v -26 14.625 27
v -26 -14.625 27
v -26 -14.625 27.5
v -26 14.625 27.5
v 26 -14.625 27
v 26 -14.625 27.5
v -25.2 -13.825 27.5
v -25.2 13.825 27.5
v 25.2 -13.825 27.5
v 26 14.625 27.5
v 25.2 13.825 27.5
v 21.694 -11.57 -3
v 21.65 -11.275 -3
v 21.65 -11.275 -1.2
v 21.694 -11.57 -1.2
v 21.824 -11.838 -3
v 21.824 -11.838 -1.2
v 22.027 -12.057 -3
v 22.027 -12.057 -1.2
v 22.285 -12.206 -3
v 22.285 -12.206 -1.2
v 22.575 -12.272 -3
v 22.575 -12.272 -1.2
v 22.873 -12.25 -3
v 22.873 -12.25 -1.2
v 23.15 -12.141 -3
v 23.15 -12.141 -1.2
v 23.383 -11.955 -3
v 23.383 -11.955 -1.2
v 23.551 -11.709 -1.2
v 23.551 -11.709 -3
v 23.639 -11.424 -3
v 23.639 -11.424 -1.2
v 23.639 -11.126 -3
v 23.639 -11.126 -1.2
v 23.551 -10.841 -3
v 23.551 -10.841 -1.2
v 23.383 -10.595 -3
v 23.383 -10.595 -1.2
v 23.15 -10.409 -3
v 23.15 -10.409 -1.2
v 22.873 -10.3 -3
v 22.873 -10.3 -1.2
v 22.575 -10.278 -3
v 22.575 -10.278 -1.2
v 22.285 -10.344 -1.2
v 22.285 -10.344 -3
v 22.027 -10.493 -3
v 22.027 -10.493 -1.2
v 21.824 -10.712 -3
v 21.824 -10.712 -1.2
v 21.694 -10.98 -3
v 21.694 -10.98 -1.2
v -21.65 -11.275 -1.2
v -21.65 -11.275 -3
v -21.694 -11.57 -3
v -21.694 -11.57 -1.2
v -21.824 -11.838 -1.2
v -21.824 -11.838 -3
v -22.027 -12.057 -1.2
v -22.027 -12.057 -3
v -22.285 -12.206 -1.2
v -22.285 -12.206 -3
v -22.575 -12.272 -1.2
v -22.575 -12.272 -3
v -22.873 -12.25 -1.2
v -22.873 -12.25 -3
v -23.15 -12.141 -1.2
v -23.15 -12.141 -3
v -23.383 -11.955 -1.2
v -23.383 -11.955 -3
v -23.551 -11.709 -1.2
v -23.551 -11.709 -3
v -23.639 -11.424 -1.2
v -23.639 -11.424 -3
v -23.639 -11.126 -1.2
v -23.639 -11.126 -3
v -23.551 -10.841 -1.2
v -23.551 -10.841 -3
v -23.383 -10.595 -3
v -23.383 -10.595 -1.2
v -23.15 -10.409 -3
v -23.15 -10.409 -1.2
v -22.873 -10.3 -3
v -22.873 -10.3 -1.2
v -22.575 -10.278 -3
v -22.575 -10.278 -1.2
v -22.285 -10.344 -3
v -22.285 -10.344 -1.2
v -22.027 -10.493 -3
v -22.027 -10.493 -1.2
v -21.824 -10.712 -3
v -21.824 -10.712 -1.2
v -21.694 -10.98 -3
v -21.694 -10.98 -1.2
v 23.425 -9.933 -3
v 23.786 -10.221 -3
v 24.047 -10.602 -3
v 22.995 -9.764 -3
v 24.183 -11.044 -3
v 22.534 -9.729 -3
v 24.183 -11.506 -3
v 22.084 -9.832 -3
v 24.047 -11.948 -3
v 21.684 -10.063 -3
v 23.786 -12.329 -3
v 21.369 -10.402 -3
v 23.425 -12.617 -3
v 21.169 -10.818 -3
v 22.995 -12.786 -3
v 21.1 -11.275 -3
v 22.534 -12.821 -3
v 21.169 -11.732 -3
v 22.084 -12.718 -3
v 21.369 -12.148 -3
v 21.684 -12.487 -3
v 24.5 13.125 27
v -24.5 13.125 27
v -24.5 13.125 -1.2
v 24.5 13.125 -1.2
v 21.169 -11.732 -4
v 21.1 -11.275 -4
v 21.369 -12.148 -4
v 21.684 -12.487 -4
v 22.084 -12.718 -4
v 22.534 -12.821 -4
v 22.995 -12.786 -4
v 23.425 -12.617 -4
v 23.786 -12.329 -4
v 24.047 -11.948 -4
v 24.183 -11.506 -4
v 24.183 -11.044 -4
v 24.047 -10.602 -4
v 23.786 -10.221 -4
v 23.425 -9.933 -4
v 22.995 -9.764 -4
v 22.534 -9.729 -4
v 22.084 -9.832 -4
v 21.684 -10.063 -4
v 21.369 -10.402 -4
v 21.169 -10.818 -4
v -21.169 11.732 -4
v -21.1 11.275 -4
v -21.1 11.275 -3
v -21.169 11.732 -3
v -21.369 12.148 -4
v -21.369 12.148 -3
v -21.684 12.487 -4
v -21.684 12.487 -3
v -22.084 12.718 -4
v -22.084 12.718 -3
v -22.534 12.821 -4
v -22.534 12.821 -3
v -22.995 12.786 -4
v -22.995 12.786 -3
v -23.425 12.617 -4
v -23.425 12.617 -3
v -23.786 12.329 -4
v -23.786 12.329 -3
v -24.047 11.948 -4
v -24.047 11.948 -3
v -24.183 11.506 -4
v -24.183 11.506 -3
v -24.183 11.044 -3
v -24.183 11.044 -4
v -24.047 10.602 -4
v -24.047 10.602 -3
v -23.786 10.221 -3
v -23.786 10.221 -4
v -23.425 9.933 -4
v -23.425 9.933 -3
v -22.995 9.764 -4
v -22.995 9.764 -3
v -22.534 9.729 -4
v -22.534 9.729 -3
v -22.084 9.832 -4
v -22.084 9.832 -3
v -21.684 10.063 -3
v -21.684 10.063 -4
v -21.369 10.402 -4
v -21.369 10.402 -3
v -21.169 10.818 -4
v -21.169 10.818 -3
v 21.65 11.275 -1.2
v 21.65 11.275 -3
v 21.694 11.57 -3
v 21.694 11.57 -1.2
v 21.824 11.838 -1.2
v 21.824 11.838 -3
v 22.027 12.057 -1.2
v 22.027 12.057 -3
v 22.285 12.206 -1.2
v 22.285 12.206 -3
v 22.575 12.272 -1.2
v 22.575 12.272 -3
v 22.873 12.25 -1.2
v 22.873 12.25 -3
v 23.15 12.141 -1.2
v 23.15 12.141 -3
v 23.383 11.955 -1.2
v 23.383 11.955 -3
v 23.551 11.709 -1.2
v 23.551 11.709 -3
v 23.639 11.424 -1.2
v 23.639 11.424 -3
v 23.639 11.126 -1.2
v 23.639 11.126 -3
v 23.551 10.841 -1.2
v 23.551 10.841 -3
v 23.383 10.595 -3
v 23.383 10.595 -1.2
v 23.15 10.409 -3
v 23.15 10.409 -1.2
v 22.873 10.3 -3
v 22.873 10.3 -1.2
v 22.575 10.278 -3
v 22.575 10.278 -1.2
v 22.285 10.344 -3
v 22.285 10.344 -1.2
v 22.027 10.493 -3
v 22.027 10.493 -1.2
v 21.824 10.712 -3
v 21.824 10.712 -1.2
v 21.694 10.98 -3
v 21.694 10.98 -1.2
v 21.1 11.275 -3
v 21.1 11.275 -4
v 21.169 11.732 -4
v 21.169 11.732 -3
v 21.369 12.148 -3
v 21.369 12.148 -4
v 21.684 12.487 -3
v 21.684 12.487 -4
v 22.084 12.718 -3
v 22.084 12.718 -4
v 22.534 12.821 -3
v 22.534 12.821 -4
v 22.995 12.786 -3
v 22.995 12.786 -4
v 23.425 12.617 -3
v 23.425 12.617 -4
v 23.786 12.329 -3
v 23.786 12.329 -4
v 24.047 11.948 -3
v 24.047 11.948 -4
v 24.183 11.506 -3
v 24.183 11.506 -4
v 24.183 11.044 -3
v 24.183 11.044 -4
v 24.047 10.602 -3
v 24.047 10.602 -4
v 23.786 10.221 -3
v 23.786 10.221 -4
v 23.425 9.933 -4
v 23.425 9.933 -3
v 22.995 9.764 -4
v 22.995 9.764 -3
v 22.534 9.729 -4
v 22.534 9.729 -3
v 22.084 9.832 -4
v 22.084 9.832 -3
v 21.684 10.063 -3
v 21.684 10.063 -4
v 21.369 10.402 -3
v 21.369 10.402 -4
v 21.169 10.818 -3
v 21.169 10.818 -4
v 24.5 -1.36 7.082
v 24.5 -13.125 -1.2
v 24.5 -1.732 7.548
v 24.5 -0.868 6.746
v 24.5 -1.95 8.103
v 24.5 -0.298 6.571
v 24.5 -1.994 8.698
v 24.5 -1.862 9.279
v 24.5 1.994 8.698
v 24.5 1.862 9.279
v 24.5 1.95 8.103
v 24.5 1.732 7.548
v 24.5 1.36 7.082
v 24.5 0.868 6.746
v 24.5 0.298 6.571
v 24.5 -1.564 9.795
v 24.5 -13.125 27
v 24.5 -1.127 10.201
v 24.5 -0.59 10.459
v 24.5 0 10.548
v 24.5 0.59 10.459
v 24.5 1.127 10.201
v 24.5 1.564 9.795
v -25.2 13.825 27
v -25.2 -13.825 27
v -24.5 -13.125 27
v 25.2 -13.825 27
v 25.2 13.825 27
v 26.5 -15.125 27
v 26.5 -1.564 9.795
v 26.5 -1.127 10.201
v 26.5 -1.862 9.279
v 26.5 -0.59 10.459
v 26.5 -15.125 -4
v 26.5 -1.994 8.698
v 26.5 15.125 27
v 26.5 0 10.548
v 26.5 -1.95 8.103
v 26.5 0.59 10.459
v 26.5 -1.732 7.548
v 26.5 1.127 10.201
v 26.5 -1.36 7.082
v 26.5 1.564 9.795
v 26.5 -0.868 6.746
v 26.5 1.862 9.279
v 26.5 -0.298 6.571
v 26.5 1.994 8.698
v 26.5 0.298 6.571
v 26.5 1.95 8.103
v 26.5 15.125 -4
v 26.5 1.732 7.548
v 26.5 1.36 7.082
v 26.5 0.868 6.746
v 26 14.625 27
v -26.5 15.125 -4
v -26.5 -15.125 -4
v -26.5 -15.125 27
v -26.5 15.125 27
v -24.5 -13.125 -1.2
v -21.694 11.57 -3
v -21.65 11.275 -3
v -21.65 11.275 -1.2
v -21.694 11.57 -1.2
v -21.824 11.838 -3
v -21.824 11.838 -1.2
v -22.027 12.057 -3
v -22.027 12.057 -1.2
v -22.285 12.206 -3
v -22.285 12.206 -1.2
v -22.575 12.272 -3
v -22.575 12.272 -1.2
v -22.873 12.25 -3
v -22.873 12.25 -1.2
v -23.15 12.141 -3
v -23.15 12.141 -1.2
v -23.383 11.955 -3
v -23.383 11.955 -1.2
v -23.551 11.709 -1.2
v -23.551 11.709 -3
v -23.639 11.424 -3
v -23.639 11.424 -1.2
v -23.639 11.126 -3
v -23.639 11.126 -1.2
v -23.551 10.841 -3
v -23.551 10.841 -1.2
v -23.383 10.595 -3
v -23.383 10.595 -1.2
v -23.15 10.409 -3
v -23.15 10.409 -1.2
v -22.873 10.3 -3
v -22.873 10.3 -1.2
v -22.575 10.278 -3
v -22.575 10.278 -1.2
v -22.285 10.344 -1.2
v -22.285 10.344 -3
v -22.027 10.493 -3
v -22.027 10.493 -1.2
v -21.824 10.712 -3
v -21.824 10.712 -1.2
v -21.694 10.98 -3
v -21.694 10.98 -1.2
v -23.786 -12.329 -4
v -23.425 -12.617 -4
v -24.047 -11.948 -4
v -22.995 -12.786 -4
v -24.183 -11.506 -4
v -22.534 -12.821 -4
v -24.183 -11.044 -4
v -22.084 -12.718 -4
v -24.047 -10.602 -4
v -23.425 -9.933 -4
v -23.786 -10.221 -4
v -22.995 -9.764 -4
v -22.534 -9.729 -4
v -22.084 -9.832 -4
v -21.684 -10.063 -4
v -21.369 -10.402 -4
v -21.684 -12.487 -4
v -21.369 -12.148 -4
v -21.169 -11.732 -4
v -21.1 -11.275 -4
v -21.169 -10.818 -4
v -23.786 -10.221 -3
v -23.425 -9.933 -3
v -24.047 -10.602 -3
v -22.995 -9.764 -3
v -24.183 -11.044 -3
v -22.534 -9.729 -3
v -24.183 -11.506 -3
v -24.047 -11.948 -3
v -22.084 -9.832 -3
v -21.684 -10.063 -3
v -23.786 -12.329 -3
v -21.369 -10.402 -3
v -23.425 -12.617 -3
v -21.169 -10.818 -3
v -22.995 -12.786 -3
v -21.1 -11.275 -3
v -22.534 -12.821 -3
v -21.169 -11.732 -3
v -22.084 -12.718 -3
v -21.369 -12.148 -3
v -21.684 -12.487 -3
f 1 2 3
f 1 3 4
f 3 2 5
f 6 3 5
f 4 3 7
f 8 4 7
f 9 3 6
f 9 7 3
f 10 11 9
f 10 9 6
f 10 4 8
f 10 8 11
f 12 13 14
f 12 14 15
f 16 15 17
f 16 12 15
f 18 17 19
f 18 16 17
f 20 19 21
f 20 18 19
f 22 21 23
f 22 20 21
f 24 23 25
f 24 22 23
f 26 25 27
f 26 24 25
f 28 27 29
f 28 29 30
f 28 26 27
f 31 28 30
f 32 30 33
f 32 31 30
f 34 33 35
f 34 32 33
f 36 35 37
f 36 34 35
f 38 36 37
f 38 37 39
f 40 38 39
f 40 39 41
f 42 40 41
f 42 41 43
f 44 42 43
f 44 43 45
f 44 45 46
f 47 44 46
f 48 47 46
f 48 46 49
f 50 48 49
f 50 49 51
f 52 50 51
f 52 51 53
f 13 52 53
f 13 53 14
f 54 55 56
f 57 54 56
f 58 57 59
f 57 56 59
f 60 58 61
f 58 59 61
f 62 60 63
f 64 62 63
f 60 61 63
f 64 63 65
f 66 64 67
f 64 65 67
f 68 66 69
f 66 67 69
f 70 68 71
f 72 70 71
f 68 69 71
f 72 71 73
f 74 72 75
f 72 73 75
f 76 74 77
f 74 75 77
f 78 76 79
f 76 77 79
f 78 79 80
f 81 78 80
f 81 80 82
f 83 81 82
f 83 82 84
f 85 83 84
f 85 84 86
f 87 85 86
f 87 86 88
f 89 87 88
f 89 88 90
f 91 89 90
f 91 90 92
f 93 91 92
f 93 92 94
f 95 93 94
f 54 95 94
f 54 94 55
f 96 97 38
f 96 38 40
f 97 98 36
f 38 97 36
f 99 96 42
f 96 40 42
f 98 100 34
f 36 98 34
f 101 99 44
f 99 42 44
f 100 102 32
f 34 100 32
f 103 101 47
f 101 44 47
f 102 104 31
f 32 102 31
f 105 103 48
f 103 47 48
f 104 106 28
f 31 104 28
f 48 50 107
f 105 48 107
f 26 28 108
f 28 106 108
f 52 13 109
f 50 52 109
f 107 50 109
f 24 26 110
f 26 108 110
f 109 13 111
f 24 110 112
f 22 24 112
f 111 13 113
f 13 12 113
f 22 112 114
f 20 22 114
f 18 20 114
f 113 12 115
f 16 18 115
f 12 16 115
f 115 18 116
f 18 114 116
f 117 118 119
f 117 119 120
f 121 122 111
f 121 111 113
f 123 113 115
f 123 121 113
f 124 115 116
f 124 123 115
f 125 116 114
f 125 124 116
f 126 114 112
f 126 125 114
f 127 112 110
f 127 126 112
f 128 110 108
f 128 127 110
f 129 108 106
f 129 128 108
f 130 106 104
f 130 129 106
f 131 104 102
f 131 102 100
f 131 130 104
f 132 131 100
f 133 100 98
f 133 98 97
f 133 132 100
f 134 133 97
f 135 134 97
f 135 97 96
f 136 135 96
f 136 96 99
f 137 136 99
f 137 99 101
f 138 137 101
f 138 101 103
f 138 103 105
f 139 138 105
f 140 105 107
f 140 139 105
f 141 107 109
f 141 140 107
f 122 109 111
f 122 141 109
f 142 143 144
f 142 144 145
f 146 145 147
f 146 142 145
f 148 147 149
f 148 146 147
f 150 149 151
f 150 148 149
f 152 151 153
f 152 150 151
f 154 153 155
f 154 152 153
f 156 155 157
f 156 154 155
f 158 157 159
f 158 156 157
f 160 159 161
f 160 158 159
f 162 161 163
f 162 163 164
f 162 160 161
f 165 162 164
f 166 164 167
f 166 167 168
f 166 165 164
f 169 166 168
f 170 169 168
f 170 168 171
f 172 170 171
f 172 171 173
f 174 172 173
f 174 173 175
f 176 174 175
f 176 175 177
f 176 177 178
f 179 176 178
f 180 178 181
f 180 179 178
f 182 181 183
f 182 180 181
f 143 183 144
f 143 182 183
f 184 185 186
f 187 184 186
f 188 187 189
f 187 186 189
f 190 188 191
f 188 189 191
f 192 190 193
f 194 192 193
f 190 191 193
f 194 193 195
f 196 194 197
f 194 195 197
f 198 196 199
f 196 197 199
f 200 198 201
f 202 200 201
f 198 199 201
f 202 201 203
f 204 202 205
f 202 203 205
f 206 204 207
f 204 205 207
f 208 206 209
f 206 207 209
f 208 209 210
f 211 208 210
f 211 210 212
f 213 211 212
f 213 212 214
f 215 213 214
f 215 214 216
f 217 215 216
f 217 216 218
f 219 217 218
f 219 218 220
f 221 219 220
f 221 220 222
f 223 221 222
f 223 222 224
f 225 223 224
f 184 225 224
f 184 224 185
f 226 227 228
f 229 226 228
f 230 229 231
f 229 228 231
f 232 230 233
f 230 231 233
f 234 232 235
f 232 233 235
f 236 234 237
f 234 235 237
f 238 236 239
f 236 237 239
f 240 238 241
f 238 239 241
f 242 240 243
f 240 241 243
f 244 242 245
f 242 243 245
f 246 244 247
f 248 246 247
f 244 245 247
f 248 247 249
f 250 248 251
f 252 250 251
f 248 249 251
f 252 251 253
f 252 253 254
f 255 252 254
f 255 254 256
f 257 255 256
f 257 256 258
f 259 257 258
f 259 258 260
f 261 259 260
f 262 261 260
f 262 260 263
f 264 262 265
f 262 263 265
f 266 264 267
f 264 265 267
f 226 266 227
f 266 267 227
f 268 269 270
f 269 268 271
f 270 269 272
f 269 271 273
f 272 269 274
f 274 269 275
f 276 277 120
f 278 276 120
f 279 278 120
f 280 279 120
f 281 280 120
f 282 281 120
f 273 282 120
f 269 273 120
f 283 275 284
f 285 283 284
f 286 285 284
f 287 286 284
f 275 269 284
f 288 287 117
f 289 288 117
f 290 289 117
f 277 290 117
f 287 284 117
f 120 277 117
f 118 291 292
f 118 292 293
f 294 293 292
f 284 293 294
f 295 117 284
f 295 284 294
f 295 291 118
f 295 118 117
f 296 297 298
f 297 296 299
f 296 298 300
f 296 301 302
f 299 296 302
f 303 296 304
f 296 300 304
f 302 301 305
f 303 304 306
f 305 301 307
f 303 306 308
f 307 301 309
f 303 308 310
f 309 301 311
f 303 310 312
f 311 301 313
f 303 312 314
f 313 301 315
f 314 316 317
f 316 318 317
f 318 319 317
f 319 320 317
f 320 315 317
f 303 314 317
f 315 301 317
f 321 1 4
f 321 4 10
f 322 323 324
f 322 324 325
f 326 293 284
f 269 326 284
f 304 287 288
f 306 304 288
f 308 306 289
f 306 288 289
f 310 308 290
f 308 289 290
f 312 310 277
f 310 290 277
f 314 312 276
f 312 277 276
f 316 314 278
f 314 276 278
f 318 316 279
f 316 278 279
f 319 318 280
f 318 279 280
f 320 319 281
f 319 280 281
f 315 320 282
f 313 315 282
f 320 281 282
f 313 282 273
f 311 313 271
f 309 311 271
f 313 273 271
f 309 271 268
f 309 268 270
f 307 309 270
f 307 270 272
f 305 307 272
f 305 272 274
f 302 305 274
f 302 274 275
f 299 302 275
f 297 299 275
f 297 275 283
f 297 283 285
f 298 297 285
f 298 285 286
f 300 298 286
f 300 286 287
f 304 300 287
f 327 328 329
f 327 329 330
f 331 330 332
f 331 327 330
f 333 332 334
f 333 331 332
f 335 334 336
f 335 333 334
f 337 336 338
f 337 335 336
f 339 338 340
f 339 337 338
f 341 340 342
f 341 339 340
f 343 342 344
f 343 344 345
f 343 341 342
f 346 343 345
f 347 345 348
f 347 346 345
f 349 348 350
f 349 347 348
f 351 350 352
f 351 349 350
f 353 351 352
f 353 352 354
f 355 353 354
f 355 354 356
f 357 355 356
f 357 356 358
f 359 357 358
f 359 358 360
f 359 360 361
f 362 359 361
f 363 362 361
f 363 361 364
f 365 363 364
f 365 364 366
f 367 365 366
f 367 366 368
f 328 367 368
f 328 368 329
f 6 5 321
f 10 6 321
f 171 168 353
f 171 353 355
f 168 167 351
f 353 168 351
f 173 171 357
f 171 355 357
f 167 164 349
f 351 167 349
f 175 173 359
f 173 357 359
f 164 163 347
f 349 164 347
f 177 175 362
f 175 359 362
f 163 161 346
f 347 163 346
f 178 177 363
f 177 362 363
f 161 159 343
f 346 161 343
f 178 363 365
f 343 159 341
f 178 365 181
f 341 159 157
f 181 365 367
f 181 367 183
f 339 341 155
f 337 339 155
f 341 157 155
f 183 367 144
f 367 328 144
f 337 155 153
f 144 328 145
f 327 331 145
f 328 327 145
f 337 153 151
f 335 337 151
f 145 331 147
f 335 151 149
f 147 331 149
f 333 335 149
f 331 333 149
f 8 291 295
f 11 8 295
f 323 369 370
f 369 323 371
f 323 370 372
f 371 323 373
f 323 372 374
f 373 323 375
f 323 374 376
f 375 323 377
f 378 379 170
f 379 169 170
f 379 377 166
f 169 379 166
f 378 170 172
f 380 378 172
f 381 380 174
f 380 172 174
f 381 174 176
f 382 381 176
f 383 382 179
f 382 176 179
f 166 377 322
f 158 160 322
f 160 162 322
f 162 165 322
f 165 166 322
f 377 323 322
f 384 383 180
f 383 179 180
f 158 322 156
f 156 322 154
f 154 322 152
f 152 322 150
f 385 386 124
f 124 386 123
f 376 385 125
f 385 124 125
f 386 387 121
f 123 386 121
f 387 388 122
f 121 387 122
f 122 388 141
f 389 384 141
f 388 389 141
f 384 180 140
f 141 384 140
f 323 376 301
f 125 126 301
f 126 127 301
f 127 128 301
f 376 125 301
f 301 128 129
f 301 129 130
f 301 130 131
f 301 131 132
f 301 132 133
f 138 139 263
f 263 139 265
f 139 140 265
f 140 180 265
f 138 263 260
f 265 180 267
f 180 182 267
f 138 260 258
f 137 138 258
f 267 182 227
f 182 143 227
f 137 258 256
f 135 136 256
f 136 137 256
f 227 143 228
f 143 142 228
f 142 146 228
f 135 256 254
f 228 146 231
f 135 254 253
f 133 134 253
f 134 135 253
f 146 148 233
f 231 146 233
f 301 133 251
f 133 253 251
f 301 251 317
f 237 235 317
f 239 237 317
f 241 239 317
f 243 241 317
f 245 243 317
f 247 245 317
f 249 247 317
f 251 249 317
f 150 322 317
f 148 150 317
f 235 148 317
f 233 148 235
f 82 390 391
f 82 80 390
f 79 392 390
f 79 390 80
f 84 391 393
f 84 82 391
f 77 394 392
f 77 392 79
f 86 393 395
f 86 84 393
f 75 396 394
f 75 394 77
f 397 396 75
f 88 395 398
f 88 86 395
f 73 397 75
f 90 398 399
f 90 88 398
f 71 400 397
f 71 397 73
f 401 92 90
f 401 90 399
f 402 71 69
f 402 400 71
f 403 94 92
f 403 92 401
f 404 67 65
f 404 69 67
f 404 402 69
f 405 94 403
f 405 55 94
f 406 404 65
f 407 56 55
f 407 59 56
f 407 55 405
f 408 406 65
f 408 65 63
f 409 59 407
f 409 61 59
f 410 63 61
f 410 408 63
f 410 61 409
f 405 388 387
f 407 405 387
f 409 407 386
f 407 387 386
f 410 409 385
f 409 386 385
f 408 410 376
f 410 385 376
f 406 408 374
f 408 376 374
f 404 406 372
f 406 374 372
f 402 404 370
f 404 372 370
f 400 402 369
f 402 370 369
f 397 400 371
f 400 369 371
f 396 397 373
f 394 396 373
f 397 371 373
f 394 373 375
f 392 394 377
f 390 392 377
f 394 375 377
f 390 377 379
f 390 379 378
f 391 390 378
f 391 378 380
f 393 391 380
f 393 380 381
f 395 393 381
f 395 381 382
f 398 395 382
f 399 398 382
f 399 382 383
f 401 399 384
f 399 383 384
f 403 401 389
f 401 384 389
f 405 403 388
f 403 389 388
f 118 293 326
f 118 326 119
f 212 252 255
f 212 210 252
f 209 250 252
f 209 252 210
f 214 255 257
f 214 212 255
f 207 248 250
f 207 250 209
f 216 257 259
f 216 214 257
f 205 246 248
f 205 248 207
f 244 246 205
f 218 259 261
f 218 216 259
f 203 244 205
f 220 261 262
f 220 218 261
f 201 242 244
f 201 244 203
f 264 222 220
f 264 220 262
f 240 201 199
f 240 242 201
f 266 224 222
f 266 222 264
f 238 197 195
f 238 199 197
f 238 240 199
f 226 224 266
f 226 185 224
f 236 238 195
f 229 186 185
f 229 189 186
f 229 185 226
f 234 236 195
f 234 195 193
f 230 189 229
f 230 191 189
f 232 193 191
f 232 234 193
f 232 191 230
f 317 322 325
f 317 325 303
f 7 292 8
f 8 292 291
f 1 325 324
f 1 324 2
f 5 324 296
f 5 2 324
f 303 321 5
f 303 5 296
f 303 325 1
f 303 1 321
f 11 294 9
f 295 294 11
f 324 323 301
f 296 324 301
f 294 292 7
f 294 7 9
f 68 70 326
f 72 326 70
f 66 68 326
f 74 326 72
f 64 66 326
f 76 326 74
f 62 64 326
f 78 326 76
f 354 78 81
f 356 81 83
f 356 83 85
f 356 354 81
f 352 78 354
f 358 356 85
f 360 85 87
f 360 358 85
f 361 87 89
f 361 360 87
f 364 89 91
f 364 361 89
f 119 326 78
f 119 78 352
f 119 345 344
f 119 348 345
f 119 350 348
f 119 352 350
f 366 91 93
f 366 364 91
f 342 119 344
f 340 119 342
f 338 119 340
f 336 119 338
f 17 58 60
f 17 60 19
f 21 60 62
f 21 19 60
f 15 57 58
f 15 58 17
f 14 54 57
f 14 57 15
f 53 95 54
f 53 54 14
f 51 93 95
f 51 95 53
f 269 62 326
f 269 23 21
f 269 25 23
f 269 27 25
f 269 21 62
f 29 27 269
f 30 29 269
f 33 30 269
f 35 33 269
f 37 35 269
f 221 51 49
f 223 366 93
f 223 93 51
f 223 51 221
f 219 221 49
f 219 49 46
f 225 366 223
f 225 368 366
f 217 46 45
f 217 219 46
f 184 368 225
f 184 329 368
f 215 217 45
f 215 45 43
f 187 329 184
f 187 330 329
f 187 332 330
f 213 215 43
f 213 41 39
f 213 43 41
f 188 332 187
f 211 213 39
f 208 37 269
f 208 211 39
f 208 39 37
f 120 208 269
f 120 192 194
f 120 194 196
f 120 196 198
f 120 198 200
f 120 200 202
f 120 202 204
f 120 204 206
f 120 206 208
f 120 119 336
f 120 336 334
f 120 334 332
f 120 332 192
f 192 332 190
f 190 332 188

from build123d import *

# Parameters (mm, degrees)
EXTRUDE_1_DEPTH          = 27
EXTRUDE_1_DEPTH_BACK     = 4
SKETCH_1_W               = 53
SKETCH_1_H               = 30.25
SKETCH_2_W               = 49
SKETCH_2_H               = 26.25
CUT_EXTRUDE_1_DEPTH      = 28.2
SKETCH_3_W               = 52
SKETCH_3_H               = 29.25
SKETCH_3_W_2             = 50.4
SKETCH_3_H_2             = 27.65
CUT_EXTRUDE_2_DEPTH      = 1
CUT_EXTRUDE_3_REACH      = 45.497
SKETCH_4_R               = 1
SKETCH_5_R               = 1.55
CUT_EXTRUDE_4_DEPTH      = 1
MIRROR_2_COPY_1_REACH    = 45.497
MIRROR_2_COPY_1_SKETCH_R = 1
MIRROR_2_COPY_2_SKETCH_R = 1.55
MIRROR_2_COPY_2_DEPTH    = 1
SKETCH_7_R               = 2
CUT_EXTRUDE_6_DEPTH      = 60.655390578
SKETCH_8_W               = 52
SKETCH_8_H               = 29.25
SKETCH_8_W_2             = 50.4
SKETCH_8_H_2             = 27.65
EXTRUDE_2_DEPTH          = 1.5


with BuildPart() as part:
    # 草图1 → 凸台-拉伸1 (new, two sides: drawn at the far end of the back side and taken through both)
    with BuildSketch(Plane.XY.offset(-EXTRUDE_1_DEPTH_BACK)):
        Rectangle(SKETCH_1_W, SKETCH_1_H)
    extrude(amount=EXTRUDE_1_DEPTH + EXTRUDE_1_DEPTH_BACK)

    # 草图2 → 切除-拉伸1 (cut)
    with BuildSketch(Plane.XY.offset(27)):
        Rectangle(SKETCH_2_W, SKETCH_2_H)
    extrude(amount=-CUT_EXTRUDE_1_DEPTH, mode=Mode.SUBTRACT)

    # 草图3 → 切除-拉伸2 (cut)
    with BuildSketch(Plane.XY.offset(27)):
        Rectangle(SKETCH_3_W, SKETCH_3_H)
        Rectangle(SKETCH_3_W_2, SKETCH_3_H_2, mode=Mode.SUBTRACT)
    extrude(amount=-CUT_EXTRUDE_2_DEPTH, mode=Mode.SUBTRACT)

    # 草图4 → 切除-拉伸3 (cut, up to next)
    with BuildSketch(Plane(origin=(0, 0, -4), x_dir=(-1, 0, 0), z_dir=(0, 0, -1)), mode=Mode.PRIVATE) as cut_extrude_3_sk1:
        with Locations((-22.65, 11.275)):
            Circle(SKETCH_4_R)
    cut_extrude_3_tool1 = extrude(cut_extrude_3_sk1.sketch, amount=-CUT_EXTRUDE_3_REACH, mode=Mode.PRIVATE) & part.part
    cut_extrude_3 = cut_extrude_3_tool1.solids().sort_by_distance((22.65, 11.275, -4))[0]
    add(cut_extrude_3, mode=Mode.SUBTRACT)

    # 草图5 → 切除-拉伸4 (cut)
    with BuildSketch(Plane(origin=(0, 0, -4), x_dir=(-1, 0, 0), z_dir=(0, 0, -1))):
        with Locations((-22.65, 11.275)):
            Circle(SKETCH_5_R)
    cut_extrude_4 = extrude(amount=-CUT_EXTRUDE_4_DEPTH, mode=Mode.SUBTRACT)

    # 镜向1: 切除-拉伸3, 切除-拉伸4 across plane
    add(cut_extrude_3.mirror(Plane.ZX), mode=Mode.SUBTRACT)
    add(cut_extrude_4.mirror(Plane.ZX), mode=Mode.SUBTRACT)

    # 镜向2: 切除-拉伸3, 切除-拉伸4 across plane
    add(cut_extrude_3.mirror(Plane(origin=(0, 0, 0), x_dir=(0, 0, 1), z_dir=(1, 0, 0))), mode=Mode.SUBTRACT)
    add(cut_extrude_4.mirror(Plane(origin=(0, 0, 0), x_dir=(0, 0, 1), z_dir=(1, 0, 0))), mode=Mode.SUBTRACT)

    # 镜向2 copy 1 sketch → 镜向2 copy 1 (cut, up to next)
    with BuildSketch(Plane(origin=(0, 0, -4), x_dir=(1, 0, 0), z_dir=(0, 0, -1)), mode=Mode.PRIVATE) as mirror_2_copy_1_sk1:
        with Locations((-22.65, 11.275)):
            Circle(MIRROR_2_COPY_1_SKETCH_R)
    mirror_2_copy_1_tool1 = extrude(mirror_2_copy_1_sk1.sketch, amount=-MIRROR_2_COPY_1_REACH, mode=Mode.PRIVATE) & part.part
    add(mirror_2_copy_1_tool1.solids().sort_by_distance((-22.65, -11.275, -4))[0], mode=Mode.SUBTRACT)

    # 镜向2 copy 2 sketch → 镜向2 copy 2 (cut)
    with BuildSketch(Plane(origin=(0, 0, -4), x_dir=(1, 0, 0), z_dir=(0, 0, -1))):
        with Locations((-22.65, 11.275)):
            Circle(MIRROR_2_COPY_2_SKETCH_R)
    extrude(amount=-MIRROR_2_COPY_2_DEPTH, mode=Mode.SUBTRACT)

    # 草图7 → 切除-拉伸6 (cut, through all)
    with BuildSketch(Plane.ZY.offset(-24.5)):
        with Locations((8.54820427, 0)):
            Circle(SKETCH_7_R)
    extrude(amount=-CUT_EXTRUDE_6_DEPTH, mode=Mode.SUBTRACT)

    # 草图8 → 凸台-拉伸2 (add)
    with BuildSketch(Plane.XY.offset(26)):
        Rectangle(SKETCH_8_W, SKETCH_8_H)
        Rectangle(SKETCH_8_W_2, SKETCH_8_H_2, mode=Mode.SUBTRACT)
    extrude(amount=EXTRUDE_2_DEPTH)


solid = part.part
